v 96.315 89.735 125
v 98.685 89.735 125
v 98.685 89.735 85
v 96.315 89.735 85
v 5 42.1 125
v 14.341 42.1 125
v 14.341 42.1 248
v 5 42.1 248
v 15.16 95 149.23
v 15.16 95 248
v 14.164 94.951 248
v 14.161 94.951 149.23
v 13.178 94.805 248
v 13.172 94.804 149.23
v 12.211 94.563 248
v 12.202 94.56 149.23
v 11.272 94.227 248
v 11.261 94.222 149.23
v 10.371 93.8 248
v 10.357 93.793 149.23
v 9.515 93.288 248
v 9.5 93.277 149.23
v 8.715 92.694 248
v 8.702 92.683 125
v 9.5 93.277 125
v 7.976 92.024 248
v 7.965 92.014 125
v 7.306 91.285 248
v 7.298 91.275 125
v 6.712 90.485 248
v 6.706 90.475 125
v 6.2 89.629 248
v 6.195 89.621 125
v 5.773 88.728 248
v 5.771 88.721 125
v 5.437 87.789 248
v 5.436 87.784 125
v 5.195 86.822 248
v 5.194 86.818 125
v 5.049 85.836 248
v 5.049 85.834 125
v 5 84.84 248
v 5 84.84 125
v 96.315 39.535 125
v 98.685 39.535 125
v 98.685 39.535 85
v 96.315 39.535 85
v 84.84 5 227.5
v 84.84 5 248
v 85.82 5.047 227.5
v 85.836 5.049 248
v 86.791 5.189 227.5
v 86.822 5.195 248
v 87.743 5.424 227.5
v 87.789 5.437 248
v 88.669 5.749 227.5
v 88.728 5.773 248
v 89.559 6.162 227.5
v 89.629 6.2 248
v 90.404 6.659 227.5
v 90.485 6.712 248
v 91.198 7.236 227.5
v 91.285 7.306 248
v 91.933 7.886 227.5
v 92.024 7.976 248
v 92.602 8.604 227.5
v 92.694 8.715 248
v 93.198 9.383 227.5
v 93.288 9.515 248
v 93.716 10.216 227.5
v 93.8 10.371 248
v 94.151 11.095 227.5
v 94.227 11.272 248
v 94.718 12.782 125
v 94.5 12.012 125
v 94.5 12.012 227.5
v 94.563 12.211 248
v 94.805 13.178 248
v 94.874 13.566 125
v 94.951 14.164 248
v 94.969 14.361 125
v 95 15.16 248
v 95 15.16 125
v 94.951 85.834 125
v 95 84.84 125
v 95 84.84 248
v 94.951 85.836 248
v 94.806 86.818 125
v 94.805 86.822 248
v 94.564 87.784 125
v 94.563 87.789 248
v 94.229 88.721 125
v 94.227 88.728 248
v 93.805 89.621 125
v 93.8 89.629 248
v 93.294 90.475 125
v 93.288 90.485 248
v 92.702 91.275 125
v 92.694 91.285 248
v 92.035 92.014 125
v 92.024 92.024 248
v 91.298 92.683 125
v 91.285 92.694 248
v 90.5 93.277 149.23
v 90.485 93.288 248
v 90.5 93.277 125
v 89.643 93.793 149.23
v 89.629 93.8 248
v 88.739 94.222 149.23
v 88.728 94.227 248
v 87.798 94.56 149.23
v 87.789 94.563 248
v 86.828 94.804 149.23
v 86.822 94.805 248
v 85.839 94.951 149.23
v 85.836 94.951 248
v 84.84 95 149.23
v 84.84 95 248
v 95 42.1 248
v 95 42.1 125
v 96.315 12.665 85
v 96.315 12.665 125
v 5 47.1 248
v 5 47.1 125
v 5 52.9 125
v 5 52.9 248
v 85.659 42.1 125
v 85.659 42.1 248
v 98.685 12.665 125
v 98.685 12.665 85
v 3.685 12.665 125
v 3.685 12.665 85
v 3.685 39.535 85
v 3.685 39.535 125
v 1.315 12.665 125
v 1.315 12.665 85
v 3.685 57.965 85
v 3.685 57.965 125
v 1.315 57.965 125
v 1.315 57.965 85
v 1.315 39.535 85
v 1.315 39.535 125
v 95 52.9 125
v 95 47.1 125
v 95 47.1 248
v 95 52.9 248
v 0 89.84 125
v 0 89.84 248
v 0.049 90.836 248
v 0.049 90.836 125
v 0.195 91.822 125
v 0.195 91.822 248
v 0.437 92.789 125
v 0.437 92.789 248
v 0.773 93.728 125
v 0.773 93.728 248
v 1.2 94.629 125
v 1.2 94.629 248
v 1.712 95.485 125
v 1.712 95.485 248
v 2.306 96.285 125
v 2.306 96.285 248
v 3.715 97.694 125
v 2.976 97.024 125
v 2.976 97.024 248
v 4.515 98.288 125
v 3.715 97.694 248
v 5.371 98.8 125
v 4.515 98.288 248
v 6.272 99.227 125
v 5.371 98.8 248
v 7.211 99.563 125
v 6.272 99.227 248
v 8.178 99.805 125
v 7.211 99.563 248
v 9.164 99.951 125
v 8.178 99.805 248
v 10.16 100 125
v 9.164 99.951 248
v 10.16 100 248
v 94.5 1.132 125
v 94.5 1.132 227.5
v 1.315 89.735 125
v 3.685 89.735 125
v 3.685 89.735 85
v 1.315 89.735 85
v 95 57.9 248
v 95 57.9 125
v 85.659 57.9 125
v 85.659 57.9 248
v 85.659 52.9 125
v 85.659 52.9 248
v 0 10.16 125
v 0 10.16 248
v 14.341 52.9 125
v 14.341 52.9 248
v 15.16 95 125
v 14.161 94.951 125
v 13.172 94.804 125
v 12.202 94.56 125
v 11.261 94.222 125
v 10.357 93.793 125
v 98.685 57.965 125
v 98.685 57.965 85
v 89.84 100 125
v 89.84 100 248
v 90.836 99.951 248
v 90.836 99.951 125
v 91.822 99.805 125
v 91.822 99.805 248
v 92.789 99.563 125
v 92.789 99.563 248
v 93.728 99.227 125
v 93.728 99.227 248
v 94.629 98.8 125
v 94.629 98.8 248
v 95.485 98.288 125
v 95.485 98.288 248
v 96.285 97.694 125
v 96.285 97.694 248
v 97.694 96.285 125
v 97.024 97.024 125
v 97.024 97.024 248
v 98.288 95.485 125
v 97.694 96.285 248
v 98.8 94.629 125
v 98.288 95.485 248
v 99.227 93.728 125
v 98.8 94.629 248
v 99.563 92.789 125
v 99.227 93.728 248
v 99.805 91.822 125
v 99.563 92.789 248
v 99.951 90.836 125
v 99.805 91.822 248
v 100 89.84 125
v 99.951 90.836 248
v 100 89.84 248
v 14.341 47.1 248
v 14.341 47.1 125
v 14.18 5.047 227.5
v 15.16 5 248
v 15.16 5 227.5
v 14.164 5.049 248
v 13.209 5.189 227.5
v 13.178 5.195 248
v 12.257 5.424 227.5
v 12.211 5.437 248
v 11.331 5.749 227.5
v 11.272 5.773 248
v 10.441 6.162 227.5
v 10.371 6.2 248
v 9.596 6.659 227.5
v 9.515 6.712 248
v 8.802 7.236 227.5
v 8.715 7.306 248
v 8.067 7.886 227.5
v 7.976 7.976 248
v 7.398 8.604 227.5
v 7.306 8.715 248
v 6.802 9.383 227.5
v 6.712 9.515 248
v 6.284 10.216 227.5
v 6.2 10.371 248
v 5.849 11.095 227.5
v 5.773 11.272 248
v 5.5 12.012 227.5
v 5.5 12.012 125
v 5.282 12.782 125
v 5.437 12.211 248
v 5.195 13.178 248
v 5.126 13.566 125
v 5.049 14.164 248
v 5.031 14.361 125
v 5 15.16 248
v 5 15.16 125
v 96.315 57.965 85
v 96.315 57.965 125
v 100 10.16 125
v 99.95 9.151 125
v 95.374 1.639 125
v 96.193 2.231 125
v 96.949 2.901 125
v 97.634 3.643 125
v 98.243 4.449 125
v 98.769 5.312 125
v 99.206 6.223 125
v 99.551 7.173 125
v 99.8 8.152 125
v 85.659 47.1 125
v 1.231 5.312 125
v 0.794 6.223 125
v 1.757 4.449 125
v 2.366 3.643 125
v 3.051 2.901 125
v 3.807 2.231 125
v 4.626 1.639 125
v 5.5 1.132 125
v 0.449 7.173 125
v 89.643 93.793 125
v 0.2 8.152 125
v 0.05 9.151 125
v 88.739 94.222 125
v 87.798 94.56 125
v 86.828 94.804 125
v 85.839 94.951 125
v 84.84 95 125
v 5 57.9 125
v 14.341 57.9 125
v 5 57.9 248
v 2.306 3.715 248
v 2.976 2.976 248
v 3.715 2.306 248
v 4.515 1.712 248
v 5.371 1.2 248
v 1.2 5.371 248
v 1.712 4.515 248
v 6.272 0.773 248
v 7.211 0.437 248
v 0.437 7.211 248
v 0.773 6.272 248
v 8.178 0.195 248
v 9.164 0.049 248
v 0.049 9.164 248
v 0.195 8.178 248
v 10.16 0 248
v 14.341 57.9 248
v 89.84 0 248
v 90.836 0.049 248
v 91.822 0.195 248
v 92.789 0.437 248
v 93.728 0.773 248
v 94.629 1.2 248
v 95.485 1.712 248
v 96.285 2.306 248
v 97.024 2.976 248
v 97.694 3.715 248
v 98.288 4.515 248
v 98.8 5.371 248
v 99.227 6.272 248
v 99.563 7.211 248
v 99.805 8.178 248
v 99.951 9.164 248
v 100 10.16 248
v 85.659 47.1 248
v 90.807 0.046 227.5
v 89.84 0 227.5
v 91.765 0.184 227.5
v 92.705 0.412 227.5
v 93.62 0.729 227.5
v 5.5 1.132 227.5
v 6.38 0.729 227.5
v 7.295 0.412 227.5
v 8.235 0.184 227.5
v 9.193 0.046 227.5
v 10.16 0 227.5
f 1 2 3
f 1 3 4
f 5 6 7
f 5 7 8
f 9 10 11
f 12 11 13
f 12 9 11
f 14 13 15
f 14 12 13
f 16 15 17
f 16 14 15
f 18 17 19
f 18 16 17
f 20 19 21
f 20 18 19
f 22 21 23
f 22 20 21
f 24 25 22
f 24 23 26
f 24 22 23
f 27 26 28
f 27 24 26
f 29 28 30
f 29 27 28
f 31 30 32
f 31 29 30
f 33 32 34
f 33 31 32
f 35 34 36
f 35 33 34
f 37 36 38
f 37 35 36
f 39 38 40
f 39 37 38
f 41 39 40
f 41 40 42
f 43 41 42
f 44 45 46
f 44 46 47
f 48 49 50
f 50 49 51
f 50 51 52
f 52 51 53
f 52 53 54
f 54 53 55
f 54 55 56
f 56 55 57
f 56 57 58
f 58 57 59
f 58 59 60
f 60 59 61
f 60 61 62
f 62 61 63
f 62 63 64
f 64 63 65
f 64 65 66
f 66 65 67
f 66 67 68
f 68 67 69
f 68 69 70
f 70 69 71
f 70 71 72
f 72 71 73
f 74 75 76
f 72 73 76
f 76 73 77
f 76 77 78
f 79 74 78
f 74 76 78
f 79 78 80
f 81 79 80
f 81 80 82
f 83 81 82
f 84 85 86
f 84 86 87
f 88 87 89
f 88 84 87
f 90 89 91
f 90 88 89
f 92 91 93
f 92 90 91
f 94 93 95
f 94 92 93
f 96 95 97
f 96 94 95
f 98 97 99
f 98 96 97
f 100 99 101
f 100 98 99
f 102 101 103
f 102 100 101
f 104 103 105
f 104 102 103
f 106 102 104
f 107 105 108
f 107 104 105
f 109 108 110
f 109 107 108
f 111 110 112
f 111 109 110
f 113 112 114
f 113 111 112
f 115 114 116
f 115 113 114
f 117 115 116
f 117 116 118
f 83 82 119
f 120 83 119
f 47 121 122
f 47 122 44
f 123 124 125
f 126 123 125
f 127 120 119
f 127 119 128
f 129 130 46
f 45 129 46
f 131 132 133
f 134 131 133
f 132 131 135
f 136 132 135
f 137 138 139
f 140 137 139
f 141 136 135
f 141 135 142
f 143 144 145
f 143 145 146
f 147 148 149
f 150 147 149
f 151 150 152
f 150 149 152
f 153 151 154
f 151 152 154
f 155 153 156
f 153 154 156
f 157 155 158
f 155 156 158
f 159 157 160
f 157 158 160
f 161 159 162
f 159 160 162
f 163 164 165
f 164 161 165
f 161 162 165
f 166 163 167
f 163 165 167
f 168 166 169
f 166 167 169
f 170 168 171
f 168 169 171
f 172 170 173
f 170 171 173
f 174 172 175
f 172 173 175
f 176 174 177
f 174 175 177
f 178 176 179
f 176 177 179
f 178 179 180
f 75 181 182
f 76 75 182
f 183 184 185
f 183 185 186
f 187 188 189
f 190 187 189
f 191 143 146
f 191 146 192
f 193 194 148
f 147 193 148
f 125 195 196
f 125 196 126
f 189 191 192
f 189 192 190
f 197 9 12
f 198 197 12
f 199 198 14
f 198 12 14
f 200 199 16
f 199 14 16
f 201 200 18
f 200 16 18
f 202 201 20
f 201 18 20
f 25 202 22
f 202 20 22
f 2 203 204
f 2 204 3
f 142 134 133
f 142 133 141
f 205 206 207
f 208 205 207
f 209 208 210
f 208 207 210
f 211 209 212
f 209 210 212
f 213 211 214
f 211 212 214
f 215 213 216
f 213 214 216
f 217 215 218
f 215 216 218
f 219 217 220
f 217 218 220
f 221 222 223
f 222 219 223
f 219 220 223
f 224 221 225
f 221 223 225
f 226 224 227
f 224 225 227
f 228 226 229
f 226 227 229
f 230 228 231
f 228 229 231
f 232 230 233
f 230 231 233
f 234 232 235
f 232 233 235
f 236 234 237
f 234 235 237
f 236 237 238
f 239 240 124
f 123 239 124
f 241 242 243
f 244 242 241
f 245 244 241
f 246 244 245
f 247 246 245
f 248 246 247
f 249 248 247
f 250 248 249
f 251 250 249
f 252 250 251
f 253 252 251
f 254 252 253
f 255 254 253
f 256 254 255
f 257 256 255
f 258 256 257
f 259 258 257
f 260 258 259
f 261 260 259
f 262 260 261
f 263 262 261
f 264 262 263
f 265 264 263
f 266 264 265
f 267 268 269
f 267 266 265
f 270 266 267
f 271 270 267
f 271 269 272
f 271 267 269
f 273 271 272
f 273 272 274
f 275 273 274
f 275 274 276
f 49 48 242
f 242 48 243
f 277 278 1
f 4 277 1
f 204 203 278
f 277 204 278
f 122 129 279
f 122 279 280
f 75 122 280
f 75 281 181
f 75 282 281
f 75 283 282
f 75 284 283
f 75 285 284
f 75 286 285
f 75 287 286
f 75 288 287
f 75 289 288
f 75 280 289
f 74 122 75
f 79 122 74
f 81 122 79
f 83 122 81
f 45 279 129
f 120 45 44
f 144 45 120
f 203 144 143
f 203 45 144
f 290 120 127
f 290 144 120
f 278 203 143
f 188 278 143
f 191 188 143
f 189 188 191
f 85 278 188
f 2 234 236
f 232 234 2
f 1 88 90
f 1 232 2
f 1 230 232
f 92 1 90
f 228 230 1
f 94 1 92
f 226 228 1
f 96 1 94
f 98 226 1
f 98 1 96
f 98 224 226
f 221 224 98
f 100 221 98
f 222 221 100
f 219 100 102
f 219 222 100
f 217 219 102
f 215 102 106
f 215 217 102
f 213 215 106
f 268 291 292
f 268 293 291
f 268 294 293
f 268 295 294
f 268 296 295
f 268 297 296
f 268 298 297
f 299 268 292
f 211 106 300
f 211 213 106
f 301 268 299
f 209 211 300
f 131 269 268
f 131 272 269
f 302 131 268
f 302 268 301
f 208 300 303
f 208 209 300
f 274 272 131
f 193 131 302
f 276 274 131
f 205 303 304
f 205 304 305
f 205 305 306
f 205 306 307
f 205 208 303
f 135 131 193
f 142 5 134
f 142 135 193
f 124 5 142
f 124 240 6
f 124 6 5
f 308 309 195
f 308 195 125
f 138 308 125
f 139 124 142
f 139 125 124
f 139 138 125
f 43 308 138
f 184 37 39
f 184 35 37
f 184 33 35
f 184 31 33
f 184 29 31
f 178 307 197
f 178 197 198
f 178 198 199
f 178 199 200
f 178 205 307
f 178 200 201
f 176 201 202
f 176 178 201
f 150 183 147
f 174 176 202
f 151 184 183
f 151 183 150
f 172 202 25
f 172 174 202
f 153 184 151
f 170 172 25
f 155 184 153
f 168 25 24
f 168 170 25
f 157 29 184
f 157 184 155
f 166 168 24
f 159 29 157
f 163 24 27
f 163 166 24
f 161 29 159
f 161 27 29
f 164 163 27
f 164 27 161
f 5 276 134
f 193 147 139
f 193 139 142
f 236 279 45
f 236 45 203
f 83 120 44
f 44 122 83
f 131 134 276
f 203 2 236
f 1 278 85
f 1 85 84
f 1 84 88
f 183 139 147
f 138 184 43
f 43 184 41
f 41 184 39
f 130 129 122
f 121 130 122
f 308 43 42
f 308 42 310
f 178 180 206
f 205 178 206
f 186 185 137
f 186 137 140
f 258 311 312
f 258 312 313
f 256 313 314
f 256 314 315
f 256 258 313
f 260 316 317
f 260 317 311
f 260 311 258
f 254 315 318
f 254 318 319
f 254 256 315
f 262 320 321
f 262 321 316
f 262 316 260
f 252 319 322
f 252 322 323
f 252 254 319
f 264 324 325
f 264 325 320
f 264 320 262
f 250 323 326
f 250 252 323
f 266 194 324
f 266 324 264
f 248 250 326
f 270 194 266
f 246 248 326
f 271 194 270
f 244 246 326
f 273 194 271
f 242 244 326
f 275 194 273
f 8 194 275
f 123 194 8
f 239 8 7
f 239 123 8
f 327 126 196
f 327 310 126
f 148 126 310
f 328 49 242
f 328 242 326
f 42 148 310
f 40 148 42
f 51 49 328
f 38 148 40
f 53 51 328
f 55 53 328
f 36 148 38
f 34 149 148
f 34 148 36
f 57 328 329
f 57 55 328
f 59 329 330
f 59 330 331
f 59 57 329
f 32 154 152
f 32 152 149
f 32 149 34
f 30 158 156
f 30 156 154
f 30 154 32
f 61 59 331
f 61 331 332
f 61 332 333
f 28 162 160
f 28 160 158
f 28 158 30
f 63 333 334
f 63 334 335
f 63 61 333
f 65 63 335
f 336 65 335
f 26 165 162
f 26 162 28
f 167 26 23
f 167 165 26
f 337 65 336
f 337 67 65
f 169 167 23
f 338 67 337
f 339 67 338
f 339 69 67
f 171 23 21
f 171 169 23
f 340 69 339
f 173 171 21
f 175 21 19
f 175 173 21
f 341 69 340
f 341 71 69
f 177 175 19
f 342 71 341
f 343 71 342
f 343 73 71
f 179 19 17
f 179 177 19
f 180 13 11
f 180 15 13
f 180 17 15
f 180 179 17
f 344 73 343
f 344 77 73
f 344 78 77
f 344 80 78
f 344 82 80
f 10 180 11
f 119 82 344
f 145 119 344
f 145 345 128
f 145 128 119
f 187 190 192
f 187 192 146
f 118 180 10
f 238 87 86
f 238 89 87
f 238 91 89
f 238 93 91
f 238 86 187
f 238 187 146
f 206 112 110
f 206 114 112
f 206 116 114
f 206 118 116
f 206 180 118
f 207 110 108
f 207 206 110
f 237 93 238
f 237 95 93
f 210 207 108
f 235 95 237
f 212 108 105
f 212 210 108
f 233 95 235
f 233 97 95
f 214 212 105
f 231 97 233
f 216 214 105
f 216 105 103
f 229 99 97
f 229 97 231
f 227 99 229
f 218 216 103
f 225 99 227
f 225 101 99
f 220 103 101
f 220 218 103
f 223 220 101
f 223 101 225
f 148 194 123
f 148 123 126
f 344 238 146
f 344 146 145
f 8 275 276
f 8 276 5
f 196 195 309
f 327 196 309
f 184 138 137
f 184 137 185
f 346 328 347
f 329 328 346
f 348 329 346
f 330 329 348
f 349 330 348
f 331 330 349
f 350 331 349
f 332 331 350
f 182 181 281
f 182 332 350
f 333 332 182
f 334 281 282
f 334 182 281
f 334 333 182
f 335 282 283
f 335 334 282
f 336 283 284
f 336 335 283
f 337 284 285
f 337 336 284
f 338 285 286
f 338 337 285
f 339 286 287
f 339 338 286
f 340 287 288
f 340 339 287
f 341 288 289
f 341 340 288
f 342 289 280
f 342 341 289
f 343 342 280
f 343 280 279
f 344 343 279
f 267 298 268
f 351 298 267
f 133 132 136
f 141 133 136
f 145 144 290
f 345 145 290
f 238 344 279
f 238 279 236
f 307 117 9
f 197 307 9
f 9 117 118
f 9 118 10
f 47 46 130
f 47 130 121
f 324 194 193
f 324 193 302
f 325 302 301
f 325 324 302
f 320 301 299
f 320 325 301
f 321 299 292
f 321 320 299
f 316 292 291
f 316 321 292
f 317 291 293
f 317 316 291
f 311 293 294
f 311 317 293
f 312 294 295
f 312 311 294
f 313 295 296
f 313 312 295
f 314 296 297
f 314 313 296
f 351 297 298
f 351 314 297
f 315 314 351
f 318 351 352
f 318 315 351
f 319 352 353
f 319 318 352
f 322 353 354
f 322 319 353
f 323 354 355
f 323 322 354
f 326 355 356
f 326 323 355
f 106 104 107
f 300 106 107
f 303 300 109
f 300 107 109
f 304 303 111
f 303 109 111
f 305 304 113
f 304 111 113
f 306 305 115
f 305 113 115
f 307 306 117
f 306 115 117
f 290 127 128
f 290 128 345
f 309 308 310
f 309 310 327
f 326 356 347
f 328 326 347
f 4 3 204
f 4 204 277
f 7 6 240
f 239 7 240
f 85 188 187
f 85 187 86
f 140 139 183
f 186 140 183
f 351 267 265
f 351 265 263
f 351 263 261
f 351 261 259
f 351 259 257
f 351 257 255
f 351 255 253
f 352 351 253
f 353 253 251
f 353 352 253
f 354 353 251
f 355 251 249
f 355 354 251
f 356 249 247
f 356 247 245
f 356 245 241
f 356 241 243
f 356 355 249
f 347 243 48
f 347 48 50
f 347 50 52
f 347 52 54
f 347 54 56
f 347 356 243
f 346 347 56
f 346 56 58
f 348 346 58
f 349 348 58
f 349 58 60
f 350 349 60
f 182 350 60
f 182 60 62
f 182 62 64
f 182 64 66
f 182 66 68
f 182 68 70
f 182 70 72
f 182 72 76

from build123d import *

# Parameters (mm, degrees)
SKETCH1_W                = 100
SKETCH1_H                = 100
BOSS_EXTRUDE1_DEPTH      = 250
SKETCH2_W                = 90
SKETCH2_H                = 90
CUT_EXTRUDE1_DEPTH       = 288.228132327
FILLET1_R                = 10.16
SKETCH3_W                = 9.3412
SKETCH3_H                = 5
BOSS_EXTRUDE2_DEPTH      = 250
SKETCH4_W                = 100
SKETCH4_H                = 125
CUT_EXTRUDE2_DEPTH       = 288.228132327
SKETCH6_W                = 81
SKETCH6_H                = 100
CUT_EXTRUDE4_DEPTH       = 5
FILLET3_R                = 10.16
BOSS_EXTRUDE3_DEPTH      = 30.48
SKETCH9_W                = 81
SKETCH9_H                = 6.25
BOSS_EXTRUDE5_DEPTH      = 35.052
CUT_EXTRUDE5_DEPTH       = 2
SKETCH12_W               = 81
SKETCH12_H               = 2.848
CUT_EXTRUDE6_DEPTH       = 24.23
SKETCH13_W               = 2.5
SKETCH13_H               = 31.9
SKETCH13_H_2             = 27
BOSS_EXTRUDE6_DEPTH      = 40
SKETCH14_W               = 2.63
SKETCH14_H               = 32.03
SKETCH14_W_2             = 2.37
SKETCH14_H_2             = 31.77
SKETCH14_H_3             = 27.13
SKETCH14_H_4             = 26.87
CUT_EXTRUDE10_DEPTH      = 40
CUT_EXTRUDE11_DEPTH      = 6.25
CUT_EXTRUDE12_DEPTH      = 173.497863465
CUT_EXTRUDE12_DEPTH_BACK = 173.497863465
BOSS_EXTRUDE7_DEPTH      = 24.23
CUT_EXTRUDE14_REACH      = 287.489
SKETCH20_W               = 89
SKETCH20_H               = 102.5


with BuildPart() as part:
    # Sketch1 → Boss-Extrude1 (new body)
    with BuildSketch(Plane.XY):
        with Locations((50, 50)):
            Rectangle(SKETCH1_W, SKETCH1_H)
    extrude(amount=BOSS_EXTRUDE1_DEPTH)

    # Sketch2 → Cut-Extrude1 (cut, through all)
    with BuildSketch(Plane(origin=(0, 0, 0), x_dir=(-1, 0, 0), z_dir=(0, 0, -1))):
        with Locations((-50, 50)):
            Rectangle(SKETCH2_W, SKETCH2_H)
    extrude(amount=-CUT_EXTRUDE1_DEPTH, mode=Mode.SUBTRACT)

    # Fillet1
    fillet1_edges = [part.edges().sort_by_distance(p)[0] for p in [
        (0, 100, 125),
        (0, 0, 125),
        (100, 0, 125),
        (100, 100, 125),
    ]]
    fillet(fillet1_edges, radius=FILLET1_R)

    # Sketch3 → Boss-Extrude2 (add, through all)
    with BuildSketch(Plane(origin=(0, 0, 0), x_dir=(-1, 0, 0), z_dir=(0, 0, -1))):
        with Locations((-90.3294, 55.4)):
            Rectangle(SKETCH3_W, SKETCH3_H)
        with Locations((-90.3294, 44.6)):
            Rectangle(SKETCH3_W, SKETCH3_H)
        with Locations((-9.6706, 44.6)):
            Rectangle(SKETCH3_W, SKETCH3_H)
        with Locations((-9.6706, 55.4)):
            Rectangle(SKETCH3_W, SKETCH3_H)
    extrude(amount=-BOSS_EXTRUDE2_DEPTH)

    # Sketch4 → Cut-Extrude2 (cut, through all)
    with BuildSketch(Plane(origin=(0, 100, 0), x_dir=(1, 0, 0), z_dir=(0, 1, 0))):
        with Locations((50, -62.5)):
            Rectangle(SKETCH4_W, SKETCH4_H)
    extrude(amount=-CUT_EXTRUDE2_DEPTH, mode=Mode.SUBTRACT)

    # Sketch6 → Cut-Extrude4 (cut)
    with BuildSketch(Plane.XZ):
        with Locations((50, 175)):
            Rectangle(SKETCH6_W, SKETCH6_H)
    extrude(amount=-CUT_EXTRUDE4_DEPTH, mode=Mode.SUBTRACT)

    # Fillet3
    fillet3_edges = [part.edges().sort_by_distance(p)[0] for p in [
        (5, 95, 187.5),
        (5, 5, 187.5),
        (95, 95, 187.5),
        (95, 5, 187.5),
    ]]
    fillet(fillet3_edges, radius=FILLET3_R)

    # Sketch7 → Boss-Extrude3 (add)
    with BuildSketch(Plane(origin=(0, 0, 125), x_dir=(-1, 0, 0), z_dir=(0, 0, -1))):
        Polygon((-95, 96), (-5, 96), (-5, 57.9), (-9.5, 57.9), (-9.5, 92.952), (-90.5, 92.952), (-90.5, 57.9), (-95, 57.9), align=None)
    extrude(amount=-BOSS_EXTRUDE3_DEPTH)

    # Sketch9 → Boss-Extrude5 (add)
    with BuildSketch(Plane.XZ.offset(-92.952)):
        with Locations((50, 152.355)):
            Rectangle(SKETCH9_W, SKETCH9_H)
    extrude(amount=BOSS_EXTRUDE5_DEPTH)

    # Sketch10 → Cut-Extrude5 (cut)
    with BuildSketch(Plane.XY.offset(250)):
        with BuildLine():
            Line((89.84, 100), (10.16, 100))
            ThreePointArc((10.16, 100), (2.975795103, 97.024204897), (0, 89.84))
            Line((0, 89.84), (0, 10.16))
            ThreePointArc((0, 10.16), (2.975795103, 2.975795103), (10.16, 0))
            Line((10.16, 0), (89.84, 0))
            ThreePointArc((89.84, 0), (97.024204897, 2.975795103), (100, 10.16))
            Line((100, 10.16), (100, 89.84))
            ThreePointArc((100, 89.84), (97.024204897, 97.024204897), (89.84, 100))
        make_face()
    extrude(amount=-CUT_EXTRUDE5_DEPTH, mode=Mode.SUBTRACT)

    # Sketch12 → Cut-Extrude6 (cut)
    with BuildSketch(Plane(origin=(0, 0, 125), x_dir=(-1, 0, 0), z_dir=(0, 0, -1))):
        with Locations((-50, 94.376)):
            Rectangle(SKETCH12_W, SKETCH12_H)
    extrude(amount=-CUT_EXTRUDE6_DEPTH, mode=Mode.SUBTRACT)

    # Sketch13 → Boss-Extrude6 (add)
    with BuildSketch(Plane(origin=(0, 0, 125), x_dir=(-1, 0, 0), z_dir=(0, 0, -1))):
        with Locations((-97.5, 73.85)):
            Rectangle(SKETCH13_W, SKETCH13_H)
        with Locations((-97.5, 26.1)):
            Rectangle(SKETCH13_W, SKETCH13_H_2)
        with Locations((-2.5, 26.1)):
            Rectangle(SKETCH13_W, SKETCH13_H_2)
        with Locations((-2.5, 73.85)):
            Rectangle(SKETCH13_W, SKETCH13_H)
    extrude(amount=BOSS_EXTRUDE6_DEPTH)

    # Sketch14 → Cut-Extrude10 (cut)
    # profile 1 of 4: a face of its own
    with BuildSketch(Plane(origin=(0, 0, 125), x_dir=(-1, 0, 0), z_dir=(0, 0, -1))):
        with Locations((-97.5, 73.85)):
            Rectangle(SKETCH14_W, SKETCH14_H)
        with Locations((-97.5, 73.85)):
            Rectangle(SKETCH14_W_2, SKETCH14_H_2, mode=Mode.SUBTRACT)
    # profile 2 of 4: a face of its own
    with BuildSketch(Plane(origin=(0, 0, 125), x_dir=(-1, 0, 0), z_dir=(0, 0, -1))):
        with Locations((-2.5, 73.85)):
            Rectangle(SKETCH14_W, SKETCH14_H)
        with Locations((-2.5, 73.85)):
            Rectangle(SKETCH14_W_2, SKETCH14_H_2, mode=Mode.SUBTRACT)
    # profile 3 of 4: a face of its own
    with BuildSketch(Plane(origin=(0, 0, 125), x_dir=(-1, 0, 0), z_dir=(0, 0, -1))):
        with Locations((-97.5, 26.1)):
            Rectangle(SKETCH14_W, SKETCH14_H_3)
        with Locations((-97.5, 26.1)):
            Rectangle(SKETCH14_W_2, SKETCH14_H_4, mode=Mode.SUBTRACT)
    # profile 4 of 4: a face of its own
    with BuildSketch(Plane(origin=(0, 0, 125), x_dir=(-1, 0, 0), z_dir=(0, 0, -1))):
        with Locations((-2.5, 26.1)):
            Rectangle(SKETCH14_W, SKETCH14_H_3)
        with Locations((-2.5, 26.1)):
            Rectangle(SKETCH14_W_2, SKETCH14_H_4, mode=Mode.SUBTRACT)
    extrude(amount=CUT_EXTRUDE10_DEPTH, mode=Mode.SUBTRACT)

    # Sketch15 → Cut-Extrude11 (cut)
    with BuildSketch(Plane.XY.offset(155.48)):
        with BuildLine():
            Line((5, 57.9), (14.3412, 57.9))
            Line((14.3412, 57.9), (85.6588, 57.9))
            Line((85.6588, 57.9), (95, 57.9))
            Line((95, 57.9), (95, 84.84))
            ThreePointArc((95, 84.84), (92.024204897, 92.024204897), (84.84, 95))
            Line((84.84, 95), (15.16, 95))
            ThreePointArc((15.16, 95), (7.975795103, 92.024204897), (5, 84.84))
            Line((5, 84.84), (5, 57.9))
        make_face()
    extrude(amount=-CUT_EXTRUDE11_DEPTH, mode=Mode.SUBTRACT)

    # Sketch16 → Cut-Extrude12 (cut, two sides: drawn at the far end of the back side and taken through both)
    with BuildSketch(Plane.XY.offset(149.23).offset(-CUT_EXTRUDE12_DEPTH_BACK)):
        with BuildLine():
            Line((5, 57.9), (95, 57.9))
            Line((95, 57.9), (95, 84.84))
            ThreePointArc((95, 84.84), (92.024204897, 92.024204897), (84.84, 95))
            Line((84.84, 95), (15.16, 95))
            ThreePointArc((15.16, 95), (7.975795103, 92.024204897), (5, 84.84))
            Line((5, 84.84), (5, 57.9))
        make_face()
    extrude(amount=CUT_EXTRUDE12_DEPTH + CUT_EXTRUDE12_DEPTH_BACK, mode=Mode.SUBTRACT)

    # Sketch17 → Boss-Extrude7 (add)
    with BuildSketch(Plane(origin=(0, 0, 149.23), x_dir=(-1, 0, 0), z_dir=(0, 0, -1))):
        with BuildLine():
            Line((-84.84, 95), (-15.16, 95))
            ThreePointArc((-15.16, 95), (-12.201837845, 94.559818757), (-9.5, 93.277416666))
            Line((-9.5, 93.277416666), (-9.5, 95.8))
            Line((-9.5, 95.8), (-90.5, 95.8))
            Line((-90.5, 95.8), (-90.5, 93.277416666))
            ThreePointArc((-90.5, 93.277416666), (-87.798162155, 94.559818757), (-84.84, 95))
        make_face()
    extrude(amount=BOSS_EXTRUDE7_DEPTH)

    # Cut-Extrude14: up to this face of the body (flat: up to its plane)
    cut_extrude14_end = Plane(part.part.faces().sort_by_distance((9.6706, 42.1, 186.5))[0])
    # Sketch20 → Cut-Extrude14 (cut, up to the picked face)
    with BuildSketch(Plane.XZ, mode=Mode.PRIVATE) as cut_extrude14_sk1:
        with Locations((50, 176.25)):
            Rectangle(SKETCH20_W, SKETCH20_H)
    cut_extrude14_tool1 = split(extrude(cut_extrude14_sk1.sketch, amount=-CUT_EXTRUDE14_REACH, mode=Mode.PRIVATE), bisect_by=cut_extrude14_end, keep=Keep.BOTH, mode=Mode.PRIVATE)
    add(cut_extrude14_tool1.solids().sort_by(Axis((50, 0, 176.25), (0, 1, 0)))[0], mode=Mode.SUBTRACT)


solid = part.part
